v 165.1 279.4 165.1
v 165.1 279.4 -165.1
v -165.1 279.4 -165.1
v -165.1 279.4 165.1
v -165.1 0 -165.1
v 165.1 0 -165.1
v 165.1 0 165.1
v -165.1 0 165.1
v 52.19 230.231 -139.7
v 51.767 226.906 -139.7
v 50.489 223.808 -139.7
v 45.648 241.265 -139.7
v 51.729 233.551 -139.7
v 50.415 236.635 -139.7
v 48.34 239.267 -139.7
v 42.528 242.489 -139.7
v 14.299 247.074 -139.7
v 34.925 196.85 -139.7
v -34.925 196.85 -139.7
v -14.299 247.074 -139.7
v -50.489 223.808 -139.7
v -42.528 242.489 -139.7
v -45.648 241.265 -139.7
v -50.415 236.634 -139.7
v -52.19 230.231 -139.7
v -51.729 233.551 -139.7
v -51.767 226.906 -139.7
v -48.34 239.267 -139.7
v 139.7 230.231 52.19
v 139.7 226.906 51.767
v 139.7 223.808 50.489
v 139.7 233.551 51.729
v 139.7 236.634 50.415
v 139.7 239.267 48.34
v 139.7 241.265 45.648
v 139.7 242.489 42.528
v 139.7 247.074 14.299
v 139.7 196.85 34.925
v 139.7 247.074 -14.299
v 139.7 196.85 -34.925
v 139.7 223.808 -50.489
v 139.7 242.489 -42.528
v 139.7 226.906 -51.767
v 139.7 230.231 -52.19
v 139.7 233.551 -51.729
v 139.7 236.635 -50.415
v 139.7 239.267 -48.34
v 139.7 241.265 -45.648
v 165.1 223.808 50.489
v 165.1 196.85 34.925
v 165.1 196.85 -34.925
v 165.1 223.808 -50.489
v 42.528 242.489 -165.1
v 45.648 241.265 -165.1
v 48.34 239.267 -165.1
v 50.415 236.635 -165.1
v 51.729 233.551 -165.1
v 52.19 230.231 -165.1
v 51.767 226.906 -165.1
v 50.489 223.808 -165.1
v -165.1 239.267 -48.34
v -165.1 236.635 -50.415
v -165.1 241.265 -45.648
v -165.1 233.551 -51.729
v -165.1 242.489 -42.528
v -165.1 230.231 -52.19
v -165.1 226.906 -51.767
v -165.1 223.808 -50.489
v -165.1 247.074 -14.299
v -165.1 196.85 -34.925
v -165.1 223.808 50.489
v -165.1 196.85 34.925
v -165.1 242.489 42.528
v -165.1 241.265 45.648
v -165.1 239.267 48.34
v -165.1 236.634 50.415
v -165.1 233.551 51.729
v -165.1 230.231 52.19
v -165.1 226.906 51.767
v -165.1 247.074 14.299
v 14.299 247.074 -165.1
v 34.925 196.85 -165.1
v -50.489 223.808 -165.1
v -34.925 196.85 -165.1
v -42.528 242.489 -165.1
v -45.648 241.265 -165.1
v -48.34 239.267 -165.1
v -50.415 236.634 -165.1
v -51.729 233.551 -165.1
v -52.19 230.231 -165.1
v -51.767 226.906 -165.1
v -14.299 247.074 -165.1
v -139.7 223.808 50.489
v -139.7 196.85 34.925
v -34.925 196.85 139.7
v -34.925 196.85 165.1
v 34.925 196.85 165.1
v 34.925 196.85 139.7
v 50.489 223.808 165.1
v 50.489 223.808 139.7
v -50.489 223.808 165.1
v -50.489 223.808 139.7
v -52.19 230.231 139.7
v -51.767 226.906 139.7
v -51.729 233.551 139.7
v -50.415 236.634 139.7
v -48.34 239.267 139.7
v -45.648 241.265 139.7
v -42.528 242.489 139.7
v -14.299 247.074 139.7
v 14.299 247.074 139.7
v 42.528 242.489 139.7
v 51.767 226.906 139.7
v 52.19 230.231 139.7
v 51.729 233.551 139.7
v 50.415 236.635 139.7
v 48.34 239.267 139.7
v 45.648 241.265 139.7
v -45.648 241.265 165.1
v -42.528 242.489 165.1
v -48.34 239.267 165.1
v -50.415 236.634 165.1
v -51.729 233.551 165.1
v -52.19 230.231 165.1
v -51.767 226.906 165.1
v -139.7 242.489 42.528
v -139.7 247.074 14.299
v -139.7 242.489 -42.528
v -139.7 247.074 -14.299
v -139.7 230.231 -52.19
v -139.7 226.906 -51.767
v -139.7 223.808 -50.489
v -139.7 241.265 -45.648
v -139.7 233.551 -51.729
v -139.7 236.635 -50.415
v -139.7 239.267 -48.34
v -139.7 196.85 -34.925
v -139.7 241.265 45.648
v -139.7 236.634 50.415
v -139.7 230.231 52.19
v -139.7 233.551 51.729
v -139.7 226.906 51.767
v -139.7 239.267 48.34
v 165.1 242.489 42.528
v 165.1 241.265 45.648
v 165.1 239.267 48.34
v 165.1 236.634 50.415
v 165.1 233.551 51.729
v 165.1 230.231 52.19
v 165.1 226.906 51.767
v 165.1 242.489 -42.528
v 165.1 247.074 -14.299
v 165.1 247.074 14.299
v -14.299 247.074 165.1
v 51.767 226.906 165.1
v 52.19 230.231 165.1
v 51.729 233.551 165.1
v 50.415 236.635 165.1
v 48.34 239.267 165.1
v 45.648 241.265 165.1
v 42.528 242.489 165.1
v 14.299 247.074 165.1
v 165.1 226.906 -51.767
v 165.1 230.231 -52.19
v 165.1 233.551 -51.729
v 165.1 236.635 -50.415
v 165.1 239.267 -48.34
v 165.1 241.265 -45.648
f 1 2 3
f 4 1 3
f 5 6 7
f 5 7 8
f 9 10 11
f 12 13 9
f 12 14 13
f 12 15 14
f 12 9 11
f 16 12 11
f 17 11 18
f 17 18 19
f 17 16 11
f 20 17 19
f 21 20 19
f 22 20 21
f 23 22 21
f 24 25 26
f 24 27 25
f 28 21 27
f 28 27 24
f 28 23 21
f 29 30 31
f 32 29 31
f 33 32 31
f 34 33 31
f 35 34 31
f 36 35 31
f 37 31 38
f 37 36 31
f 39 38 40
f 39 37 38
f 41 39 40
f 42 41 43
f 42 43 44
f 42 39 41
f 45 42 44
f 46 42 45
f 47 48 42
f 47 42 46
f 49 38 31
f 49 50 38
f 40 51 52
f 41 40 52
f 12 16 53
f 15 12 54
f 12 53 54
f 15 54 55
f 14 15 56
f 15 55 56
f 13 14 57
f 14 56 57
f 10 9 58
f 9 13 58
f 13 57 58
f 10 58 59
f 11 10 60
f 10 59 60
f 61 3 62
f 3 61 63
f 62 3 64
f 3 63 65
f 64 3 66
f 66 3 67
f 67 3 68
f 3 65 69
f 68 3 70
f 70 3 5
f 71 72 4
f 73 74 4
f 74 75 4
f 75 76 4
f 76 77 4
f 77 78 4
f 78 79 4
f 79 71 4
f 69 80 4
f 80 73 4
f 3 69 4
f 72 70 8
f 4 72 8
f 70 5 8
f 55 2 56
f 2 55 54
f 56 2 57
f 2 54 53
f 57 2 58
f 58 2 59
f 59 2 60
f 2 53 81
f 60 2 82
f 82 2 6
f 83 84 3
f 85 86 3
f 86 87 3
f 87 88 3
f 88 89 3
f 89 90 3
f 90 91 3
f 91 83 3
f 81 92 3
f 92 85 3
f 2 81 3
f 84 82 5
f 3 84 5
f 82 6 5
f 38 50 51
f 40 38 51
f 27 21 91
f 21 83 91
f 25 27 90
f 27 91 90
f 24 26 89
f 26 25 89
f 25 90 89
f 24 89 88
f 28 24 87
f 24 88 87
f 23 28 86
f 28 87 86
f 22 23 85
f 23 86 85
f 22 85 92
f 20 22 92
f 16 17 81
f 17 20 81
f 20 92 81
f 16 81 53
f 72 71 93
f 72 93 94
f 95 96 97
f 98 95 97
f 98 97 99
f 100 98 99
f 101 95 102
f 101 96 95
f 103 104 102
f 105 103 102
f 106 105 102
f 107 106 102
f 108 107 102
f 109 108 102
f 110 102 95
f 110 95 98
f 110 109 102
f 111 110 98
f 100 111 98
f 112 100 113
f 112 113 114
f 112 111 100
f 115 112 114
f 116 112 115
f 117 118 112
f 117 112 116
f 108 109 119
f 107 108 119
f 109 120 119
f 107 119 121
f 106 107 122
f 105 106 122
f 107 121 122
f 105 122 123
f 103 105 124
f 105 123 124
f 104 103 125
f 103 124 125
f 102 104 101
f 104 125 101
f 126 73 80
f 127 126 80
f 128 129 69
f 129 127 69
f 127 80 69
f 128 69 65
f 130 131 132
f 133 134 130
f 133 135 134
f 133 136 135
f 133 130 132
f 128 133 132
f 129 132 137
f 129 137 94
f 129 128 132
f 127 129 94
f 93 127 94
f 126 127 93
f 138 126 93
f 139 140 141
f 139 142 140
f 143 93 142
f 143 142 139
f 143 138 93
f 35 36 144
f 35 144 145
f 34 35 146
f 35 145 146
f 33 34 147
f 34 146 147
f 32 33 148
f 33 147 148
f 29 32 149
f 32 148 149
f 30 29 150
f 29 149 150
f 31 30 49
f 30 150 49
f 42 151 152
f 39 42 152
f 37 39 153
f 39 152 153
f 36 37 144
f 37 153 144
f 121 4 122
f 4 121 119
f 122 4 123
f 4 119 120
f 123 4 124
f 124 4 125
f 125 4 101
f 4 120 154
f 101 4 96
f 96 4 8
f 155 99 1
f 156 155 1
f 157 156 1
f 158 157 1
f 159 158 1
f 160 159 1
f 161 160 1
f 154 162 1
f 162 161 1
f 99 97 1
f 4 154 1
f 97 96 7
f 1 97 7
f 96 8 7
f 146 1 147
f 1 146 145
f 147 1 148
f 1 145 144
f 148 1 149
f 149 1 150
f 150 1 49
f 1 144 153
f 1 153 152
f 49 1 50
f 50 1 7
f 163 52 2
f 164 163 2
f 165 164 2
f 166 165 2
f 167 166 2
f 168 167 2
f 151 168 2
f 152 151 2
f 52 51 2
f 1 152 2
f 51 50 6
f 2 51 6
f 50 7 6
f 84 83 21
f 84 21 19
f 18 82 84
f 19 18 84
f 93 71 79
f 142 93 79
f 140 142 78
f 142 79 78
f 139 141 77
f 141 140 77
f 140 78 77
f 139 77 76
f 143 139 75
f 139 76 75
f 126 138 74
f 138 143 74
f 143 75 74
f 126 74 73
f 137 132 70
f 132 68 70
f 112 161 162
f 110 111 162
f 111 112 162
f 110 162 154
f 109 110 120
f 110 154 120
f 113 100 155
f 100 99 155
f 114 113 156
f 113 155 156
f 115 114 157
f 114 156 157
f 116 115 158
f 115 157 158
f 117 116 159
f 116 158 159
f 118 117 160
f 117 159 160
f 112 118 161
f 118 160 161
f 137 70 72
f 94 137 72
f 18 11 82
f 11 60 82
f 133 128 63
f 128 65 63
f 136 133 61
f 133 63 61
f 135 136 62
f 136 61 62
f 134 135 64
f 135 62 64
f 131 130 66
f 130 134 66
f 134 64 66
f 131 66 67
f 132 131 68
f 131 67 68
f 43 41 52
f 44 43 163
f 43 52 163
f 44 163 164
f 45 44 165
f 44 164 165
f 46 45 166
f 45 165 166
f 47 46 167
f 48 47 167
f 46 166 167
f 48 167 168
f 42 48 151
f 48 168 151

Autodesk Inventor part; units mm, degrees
sketch "Sketch1" plane through (0, 0, 0) normal (0, 1, 0) x (-1, 0, 0)
  line L0 (165.1, 165.1) -> (-165.1, 165.1)
  line L1 (-165.1, 165.1) -> (-165.1, -165.1)
  line L2 (-165.1, -165.1) -> (165.1, -165.1)
  line L3 (165.1, -165.1) -> (165.1, 165.1)
  point P0 (0, 0)
  dimension "d0" = 330.2
  dimension "d1" = 330.2
  dimension "d2" = 165.1
  dimension "d3" = 165.1
extrude "Extrusion1" add sketch "Sketch1" along normal blind 279.4
sketch "Sketch2" plane through (-165.1, 0, 165.1) normal (0, 0, 1) x (1, 0, 0)
  line L0 (0, 279.4) -> (330.2, 279.4) projected
  line L1 (165.1, 279.4) -> (165.1, 247.65)
  arc A0 (207.6282, 242.4889) -> (122.5718, 242.4889) centre (165.1, 69.85) ccw
  line L2 (130.175, 196.85) -> (200.025, 196.85)
  line L3 (200.025, 196.85) -> (215.589, 223.8076)
  line L4 (130.175, 196.85) -> (114.611, 223.8076)
  arc A1 (122.5718, 242.4889) -> (114.611, 223.8076) centre (125.6096, 230.1576) ccw
  arc A2 (215.589, 223.8076) -> (207.6282, 242.4889) centre (204.5904, 230.1576) ccw
  point P0 (165.1, 0)
  dimension "d6" = 31.75
  dimension "d8" = 177.8
  dimension "d10" = 0
  dimension "d11" = 69.85
  dimension "d12" = 34.925
  dimension "d13" = 50.8
  dimension "d16" = 120
  dimension "d17" = 120
  dimension "d18" = 12.7
extrude "Extrusion2" cut sketch "Sketch2" against normal blind 25.4
sketch "Sketch3" plane through (165.1, 0, 165.1) normal (1, 0, 0) x (0, 0, -1)
  arc A0 (207.6282, 242.4889) -> (122.5718, 242.4889) centre (165.1, 69.85) ccw
  line L0 (130.175, 196.85) -> (200.025, 196.85)
  line L1 (200.025, 196.85) -> (215.589, 223.8076)
  line L2 (130.175, 196.85) -> (114.611, 223.8076)
  arc A1 (122.5718, 242.4889) -> (114.611, 223.8076) centre (125.6096, 230.1576) ccw
  arc A2 (215.589, 223.8076) -> (207.6282, 242.4889) centre (204.5904, 230.1576) ccw
  line L3 (0, 279.4) -> (330.2, 279.4) projected
  point P0 (165.1, 0)
  point P1 (165.1, 247.65)
  dimension "d21" = 177.8
  dimension "d22" = 69.85
  dimension "d23" = 50.8
  dimension "d24" = 120
  dimension "d25" = 120
  dimension "d26" = 12.7
  dimension "d27" = 31.75
  dimension "d28" = 34.925
extrude "Extrusion3" cut sketch "Sketch3" against normal blind 25.4
mirror "Mirror1" about plane through (0, 0, 0) normal (0, 0, 1) of "Extrusion2"
mirror "Mirror2" about plane through (0, 0, 0) normal (1, 0, 0) of "Extrusion3"
equation "\"d12\" = 0.5 * d11"
properties part number "POWER CUBE  1-9-2018"
